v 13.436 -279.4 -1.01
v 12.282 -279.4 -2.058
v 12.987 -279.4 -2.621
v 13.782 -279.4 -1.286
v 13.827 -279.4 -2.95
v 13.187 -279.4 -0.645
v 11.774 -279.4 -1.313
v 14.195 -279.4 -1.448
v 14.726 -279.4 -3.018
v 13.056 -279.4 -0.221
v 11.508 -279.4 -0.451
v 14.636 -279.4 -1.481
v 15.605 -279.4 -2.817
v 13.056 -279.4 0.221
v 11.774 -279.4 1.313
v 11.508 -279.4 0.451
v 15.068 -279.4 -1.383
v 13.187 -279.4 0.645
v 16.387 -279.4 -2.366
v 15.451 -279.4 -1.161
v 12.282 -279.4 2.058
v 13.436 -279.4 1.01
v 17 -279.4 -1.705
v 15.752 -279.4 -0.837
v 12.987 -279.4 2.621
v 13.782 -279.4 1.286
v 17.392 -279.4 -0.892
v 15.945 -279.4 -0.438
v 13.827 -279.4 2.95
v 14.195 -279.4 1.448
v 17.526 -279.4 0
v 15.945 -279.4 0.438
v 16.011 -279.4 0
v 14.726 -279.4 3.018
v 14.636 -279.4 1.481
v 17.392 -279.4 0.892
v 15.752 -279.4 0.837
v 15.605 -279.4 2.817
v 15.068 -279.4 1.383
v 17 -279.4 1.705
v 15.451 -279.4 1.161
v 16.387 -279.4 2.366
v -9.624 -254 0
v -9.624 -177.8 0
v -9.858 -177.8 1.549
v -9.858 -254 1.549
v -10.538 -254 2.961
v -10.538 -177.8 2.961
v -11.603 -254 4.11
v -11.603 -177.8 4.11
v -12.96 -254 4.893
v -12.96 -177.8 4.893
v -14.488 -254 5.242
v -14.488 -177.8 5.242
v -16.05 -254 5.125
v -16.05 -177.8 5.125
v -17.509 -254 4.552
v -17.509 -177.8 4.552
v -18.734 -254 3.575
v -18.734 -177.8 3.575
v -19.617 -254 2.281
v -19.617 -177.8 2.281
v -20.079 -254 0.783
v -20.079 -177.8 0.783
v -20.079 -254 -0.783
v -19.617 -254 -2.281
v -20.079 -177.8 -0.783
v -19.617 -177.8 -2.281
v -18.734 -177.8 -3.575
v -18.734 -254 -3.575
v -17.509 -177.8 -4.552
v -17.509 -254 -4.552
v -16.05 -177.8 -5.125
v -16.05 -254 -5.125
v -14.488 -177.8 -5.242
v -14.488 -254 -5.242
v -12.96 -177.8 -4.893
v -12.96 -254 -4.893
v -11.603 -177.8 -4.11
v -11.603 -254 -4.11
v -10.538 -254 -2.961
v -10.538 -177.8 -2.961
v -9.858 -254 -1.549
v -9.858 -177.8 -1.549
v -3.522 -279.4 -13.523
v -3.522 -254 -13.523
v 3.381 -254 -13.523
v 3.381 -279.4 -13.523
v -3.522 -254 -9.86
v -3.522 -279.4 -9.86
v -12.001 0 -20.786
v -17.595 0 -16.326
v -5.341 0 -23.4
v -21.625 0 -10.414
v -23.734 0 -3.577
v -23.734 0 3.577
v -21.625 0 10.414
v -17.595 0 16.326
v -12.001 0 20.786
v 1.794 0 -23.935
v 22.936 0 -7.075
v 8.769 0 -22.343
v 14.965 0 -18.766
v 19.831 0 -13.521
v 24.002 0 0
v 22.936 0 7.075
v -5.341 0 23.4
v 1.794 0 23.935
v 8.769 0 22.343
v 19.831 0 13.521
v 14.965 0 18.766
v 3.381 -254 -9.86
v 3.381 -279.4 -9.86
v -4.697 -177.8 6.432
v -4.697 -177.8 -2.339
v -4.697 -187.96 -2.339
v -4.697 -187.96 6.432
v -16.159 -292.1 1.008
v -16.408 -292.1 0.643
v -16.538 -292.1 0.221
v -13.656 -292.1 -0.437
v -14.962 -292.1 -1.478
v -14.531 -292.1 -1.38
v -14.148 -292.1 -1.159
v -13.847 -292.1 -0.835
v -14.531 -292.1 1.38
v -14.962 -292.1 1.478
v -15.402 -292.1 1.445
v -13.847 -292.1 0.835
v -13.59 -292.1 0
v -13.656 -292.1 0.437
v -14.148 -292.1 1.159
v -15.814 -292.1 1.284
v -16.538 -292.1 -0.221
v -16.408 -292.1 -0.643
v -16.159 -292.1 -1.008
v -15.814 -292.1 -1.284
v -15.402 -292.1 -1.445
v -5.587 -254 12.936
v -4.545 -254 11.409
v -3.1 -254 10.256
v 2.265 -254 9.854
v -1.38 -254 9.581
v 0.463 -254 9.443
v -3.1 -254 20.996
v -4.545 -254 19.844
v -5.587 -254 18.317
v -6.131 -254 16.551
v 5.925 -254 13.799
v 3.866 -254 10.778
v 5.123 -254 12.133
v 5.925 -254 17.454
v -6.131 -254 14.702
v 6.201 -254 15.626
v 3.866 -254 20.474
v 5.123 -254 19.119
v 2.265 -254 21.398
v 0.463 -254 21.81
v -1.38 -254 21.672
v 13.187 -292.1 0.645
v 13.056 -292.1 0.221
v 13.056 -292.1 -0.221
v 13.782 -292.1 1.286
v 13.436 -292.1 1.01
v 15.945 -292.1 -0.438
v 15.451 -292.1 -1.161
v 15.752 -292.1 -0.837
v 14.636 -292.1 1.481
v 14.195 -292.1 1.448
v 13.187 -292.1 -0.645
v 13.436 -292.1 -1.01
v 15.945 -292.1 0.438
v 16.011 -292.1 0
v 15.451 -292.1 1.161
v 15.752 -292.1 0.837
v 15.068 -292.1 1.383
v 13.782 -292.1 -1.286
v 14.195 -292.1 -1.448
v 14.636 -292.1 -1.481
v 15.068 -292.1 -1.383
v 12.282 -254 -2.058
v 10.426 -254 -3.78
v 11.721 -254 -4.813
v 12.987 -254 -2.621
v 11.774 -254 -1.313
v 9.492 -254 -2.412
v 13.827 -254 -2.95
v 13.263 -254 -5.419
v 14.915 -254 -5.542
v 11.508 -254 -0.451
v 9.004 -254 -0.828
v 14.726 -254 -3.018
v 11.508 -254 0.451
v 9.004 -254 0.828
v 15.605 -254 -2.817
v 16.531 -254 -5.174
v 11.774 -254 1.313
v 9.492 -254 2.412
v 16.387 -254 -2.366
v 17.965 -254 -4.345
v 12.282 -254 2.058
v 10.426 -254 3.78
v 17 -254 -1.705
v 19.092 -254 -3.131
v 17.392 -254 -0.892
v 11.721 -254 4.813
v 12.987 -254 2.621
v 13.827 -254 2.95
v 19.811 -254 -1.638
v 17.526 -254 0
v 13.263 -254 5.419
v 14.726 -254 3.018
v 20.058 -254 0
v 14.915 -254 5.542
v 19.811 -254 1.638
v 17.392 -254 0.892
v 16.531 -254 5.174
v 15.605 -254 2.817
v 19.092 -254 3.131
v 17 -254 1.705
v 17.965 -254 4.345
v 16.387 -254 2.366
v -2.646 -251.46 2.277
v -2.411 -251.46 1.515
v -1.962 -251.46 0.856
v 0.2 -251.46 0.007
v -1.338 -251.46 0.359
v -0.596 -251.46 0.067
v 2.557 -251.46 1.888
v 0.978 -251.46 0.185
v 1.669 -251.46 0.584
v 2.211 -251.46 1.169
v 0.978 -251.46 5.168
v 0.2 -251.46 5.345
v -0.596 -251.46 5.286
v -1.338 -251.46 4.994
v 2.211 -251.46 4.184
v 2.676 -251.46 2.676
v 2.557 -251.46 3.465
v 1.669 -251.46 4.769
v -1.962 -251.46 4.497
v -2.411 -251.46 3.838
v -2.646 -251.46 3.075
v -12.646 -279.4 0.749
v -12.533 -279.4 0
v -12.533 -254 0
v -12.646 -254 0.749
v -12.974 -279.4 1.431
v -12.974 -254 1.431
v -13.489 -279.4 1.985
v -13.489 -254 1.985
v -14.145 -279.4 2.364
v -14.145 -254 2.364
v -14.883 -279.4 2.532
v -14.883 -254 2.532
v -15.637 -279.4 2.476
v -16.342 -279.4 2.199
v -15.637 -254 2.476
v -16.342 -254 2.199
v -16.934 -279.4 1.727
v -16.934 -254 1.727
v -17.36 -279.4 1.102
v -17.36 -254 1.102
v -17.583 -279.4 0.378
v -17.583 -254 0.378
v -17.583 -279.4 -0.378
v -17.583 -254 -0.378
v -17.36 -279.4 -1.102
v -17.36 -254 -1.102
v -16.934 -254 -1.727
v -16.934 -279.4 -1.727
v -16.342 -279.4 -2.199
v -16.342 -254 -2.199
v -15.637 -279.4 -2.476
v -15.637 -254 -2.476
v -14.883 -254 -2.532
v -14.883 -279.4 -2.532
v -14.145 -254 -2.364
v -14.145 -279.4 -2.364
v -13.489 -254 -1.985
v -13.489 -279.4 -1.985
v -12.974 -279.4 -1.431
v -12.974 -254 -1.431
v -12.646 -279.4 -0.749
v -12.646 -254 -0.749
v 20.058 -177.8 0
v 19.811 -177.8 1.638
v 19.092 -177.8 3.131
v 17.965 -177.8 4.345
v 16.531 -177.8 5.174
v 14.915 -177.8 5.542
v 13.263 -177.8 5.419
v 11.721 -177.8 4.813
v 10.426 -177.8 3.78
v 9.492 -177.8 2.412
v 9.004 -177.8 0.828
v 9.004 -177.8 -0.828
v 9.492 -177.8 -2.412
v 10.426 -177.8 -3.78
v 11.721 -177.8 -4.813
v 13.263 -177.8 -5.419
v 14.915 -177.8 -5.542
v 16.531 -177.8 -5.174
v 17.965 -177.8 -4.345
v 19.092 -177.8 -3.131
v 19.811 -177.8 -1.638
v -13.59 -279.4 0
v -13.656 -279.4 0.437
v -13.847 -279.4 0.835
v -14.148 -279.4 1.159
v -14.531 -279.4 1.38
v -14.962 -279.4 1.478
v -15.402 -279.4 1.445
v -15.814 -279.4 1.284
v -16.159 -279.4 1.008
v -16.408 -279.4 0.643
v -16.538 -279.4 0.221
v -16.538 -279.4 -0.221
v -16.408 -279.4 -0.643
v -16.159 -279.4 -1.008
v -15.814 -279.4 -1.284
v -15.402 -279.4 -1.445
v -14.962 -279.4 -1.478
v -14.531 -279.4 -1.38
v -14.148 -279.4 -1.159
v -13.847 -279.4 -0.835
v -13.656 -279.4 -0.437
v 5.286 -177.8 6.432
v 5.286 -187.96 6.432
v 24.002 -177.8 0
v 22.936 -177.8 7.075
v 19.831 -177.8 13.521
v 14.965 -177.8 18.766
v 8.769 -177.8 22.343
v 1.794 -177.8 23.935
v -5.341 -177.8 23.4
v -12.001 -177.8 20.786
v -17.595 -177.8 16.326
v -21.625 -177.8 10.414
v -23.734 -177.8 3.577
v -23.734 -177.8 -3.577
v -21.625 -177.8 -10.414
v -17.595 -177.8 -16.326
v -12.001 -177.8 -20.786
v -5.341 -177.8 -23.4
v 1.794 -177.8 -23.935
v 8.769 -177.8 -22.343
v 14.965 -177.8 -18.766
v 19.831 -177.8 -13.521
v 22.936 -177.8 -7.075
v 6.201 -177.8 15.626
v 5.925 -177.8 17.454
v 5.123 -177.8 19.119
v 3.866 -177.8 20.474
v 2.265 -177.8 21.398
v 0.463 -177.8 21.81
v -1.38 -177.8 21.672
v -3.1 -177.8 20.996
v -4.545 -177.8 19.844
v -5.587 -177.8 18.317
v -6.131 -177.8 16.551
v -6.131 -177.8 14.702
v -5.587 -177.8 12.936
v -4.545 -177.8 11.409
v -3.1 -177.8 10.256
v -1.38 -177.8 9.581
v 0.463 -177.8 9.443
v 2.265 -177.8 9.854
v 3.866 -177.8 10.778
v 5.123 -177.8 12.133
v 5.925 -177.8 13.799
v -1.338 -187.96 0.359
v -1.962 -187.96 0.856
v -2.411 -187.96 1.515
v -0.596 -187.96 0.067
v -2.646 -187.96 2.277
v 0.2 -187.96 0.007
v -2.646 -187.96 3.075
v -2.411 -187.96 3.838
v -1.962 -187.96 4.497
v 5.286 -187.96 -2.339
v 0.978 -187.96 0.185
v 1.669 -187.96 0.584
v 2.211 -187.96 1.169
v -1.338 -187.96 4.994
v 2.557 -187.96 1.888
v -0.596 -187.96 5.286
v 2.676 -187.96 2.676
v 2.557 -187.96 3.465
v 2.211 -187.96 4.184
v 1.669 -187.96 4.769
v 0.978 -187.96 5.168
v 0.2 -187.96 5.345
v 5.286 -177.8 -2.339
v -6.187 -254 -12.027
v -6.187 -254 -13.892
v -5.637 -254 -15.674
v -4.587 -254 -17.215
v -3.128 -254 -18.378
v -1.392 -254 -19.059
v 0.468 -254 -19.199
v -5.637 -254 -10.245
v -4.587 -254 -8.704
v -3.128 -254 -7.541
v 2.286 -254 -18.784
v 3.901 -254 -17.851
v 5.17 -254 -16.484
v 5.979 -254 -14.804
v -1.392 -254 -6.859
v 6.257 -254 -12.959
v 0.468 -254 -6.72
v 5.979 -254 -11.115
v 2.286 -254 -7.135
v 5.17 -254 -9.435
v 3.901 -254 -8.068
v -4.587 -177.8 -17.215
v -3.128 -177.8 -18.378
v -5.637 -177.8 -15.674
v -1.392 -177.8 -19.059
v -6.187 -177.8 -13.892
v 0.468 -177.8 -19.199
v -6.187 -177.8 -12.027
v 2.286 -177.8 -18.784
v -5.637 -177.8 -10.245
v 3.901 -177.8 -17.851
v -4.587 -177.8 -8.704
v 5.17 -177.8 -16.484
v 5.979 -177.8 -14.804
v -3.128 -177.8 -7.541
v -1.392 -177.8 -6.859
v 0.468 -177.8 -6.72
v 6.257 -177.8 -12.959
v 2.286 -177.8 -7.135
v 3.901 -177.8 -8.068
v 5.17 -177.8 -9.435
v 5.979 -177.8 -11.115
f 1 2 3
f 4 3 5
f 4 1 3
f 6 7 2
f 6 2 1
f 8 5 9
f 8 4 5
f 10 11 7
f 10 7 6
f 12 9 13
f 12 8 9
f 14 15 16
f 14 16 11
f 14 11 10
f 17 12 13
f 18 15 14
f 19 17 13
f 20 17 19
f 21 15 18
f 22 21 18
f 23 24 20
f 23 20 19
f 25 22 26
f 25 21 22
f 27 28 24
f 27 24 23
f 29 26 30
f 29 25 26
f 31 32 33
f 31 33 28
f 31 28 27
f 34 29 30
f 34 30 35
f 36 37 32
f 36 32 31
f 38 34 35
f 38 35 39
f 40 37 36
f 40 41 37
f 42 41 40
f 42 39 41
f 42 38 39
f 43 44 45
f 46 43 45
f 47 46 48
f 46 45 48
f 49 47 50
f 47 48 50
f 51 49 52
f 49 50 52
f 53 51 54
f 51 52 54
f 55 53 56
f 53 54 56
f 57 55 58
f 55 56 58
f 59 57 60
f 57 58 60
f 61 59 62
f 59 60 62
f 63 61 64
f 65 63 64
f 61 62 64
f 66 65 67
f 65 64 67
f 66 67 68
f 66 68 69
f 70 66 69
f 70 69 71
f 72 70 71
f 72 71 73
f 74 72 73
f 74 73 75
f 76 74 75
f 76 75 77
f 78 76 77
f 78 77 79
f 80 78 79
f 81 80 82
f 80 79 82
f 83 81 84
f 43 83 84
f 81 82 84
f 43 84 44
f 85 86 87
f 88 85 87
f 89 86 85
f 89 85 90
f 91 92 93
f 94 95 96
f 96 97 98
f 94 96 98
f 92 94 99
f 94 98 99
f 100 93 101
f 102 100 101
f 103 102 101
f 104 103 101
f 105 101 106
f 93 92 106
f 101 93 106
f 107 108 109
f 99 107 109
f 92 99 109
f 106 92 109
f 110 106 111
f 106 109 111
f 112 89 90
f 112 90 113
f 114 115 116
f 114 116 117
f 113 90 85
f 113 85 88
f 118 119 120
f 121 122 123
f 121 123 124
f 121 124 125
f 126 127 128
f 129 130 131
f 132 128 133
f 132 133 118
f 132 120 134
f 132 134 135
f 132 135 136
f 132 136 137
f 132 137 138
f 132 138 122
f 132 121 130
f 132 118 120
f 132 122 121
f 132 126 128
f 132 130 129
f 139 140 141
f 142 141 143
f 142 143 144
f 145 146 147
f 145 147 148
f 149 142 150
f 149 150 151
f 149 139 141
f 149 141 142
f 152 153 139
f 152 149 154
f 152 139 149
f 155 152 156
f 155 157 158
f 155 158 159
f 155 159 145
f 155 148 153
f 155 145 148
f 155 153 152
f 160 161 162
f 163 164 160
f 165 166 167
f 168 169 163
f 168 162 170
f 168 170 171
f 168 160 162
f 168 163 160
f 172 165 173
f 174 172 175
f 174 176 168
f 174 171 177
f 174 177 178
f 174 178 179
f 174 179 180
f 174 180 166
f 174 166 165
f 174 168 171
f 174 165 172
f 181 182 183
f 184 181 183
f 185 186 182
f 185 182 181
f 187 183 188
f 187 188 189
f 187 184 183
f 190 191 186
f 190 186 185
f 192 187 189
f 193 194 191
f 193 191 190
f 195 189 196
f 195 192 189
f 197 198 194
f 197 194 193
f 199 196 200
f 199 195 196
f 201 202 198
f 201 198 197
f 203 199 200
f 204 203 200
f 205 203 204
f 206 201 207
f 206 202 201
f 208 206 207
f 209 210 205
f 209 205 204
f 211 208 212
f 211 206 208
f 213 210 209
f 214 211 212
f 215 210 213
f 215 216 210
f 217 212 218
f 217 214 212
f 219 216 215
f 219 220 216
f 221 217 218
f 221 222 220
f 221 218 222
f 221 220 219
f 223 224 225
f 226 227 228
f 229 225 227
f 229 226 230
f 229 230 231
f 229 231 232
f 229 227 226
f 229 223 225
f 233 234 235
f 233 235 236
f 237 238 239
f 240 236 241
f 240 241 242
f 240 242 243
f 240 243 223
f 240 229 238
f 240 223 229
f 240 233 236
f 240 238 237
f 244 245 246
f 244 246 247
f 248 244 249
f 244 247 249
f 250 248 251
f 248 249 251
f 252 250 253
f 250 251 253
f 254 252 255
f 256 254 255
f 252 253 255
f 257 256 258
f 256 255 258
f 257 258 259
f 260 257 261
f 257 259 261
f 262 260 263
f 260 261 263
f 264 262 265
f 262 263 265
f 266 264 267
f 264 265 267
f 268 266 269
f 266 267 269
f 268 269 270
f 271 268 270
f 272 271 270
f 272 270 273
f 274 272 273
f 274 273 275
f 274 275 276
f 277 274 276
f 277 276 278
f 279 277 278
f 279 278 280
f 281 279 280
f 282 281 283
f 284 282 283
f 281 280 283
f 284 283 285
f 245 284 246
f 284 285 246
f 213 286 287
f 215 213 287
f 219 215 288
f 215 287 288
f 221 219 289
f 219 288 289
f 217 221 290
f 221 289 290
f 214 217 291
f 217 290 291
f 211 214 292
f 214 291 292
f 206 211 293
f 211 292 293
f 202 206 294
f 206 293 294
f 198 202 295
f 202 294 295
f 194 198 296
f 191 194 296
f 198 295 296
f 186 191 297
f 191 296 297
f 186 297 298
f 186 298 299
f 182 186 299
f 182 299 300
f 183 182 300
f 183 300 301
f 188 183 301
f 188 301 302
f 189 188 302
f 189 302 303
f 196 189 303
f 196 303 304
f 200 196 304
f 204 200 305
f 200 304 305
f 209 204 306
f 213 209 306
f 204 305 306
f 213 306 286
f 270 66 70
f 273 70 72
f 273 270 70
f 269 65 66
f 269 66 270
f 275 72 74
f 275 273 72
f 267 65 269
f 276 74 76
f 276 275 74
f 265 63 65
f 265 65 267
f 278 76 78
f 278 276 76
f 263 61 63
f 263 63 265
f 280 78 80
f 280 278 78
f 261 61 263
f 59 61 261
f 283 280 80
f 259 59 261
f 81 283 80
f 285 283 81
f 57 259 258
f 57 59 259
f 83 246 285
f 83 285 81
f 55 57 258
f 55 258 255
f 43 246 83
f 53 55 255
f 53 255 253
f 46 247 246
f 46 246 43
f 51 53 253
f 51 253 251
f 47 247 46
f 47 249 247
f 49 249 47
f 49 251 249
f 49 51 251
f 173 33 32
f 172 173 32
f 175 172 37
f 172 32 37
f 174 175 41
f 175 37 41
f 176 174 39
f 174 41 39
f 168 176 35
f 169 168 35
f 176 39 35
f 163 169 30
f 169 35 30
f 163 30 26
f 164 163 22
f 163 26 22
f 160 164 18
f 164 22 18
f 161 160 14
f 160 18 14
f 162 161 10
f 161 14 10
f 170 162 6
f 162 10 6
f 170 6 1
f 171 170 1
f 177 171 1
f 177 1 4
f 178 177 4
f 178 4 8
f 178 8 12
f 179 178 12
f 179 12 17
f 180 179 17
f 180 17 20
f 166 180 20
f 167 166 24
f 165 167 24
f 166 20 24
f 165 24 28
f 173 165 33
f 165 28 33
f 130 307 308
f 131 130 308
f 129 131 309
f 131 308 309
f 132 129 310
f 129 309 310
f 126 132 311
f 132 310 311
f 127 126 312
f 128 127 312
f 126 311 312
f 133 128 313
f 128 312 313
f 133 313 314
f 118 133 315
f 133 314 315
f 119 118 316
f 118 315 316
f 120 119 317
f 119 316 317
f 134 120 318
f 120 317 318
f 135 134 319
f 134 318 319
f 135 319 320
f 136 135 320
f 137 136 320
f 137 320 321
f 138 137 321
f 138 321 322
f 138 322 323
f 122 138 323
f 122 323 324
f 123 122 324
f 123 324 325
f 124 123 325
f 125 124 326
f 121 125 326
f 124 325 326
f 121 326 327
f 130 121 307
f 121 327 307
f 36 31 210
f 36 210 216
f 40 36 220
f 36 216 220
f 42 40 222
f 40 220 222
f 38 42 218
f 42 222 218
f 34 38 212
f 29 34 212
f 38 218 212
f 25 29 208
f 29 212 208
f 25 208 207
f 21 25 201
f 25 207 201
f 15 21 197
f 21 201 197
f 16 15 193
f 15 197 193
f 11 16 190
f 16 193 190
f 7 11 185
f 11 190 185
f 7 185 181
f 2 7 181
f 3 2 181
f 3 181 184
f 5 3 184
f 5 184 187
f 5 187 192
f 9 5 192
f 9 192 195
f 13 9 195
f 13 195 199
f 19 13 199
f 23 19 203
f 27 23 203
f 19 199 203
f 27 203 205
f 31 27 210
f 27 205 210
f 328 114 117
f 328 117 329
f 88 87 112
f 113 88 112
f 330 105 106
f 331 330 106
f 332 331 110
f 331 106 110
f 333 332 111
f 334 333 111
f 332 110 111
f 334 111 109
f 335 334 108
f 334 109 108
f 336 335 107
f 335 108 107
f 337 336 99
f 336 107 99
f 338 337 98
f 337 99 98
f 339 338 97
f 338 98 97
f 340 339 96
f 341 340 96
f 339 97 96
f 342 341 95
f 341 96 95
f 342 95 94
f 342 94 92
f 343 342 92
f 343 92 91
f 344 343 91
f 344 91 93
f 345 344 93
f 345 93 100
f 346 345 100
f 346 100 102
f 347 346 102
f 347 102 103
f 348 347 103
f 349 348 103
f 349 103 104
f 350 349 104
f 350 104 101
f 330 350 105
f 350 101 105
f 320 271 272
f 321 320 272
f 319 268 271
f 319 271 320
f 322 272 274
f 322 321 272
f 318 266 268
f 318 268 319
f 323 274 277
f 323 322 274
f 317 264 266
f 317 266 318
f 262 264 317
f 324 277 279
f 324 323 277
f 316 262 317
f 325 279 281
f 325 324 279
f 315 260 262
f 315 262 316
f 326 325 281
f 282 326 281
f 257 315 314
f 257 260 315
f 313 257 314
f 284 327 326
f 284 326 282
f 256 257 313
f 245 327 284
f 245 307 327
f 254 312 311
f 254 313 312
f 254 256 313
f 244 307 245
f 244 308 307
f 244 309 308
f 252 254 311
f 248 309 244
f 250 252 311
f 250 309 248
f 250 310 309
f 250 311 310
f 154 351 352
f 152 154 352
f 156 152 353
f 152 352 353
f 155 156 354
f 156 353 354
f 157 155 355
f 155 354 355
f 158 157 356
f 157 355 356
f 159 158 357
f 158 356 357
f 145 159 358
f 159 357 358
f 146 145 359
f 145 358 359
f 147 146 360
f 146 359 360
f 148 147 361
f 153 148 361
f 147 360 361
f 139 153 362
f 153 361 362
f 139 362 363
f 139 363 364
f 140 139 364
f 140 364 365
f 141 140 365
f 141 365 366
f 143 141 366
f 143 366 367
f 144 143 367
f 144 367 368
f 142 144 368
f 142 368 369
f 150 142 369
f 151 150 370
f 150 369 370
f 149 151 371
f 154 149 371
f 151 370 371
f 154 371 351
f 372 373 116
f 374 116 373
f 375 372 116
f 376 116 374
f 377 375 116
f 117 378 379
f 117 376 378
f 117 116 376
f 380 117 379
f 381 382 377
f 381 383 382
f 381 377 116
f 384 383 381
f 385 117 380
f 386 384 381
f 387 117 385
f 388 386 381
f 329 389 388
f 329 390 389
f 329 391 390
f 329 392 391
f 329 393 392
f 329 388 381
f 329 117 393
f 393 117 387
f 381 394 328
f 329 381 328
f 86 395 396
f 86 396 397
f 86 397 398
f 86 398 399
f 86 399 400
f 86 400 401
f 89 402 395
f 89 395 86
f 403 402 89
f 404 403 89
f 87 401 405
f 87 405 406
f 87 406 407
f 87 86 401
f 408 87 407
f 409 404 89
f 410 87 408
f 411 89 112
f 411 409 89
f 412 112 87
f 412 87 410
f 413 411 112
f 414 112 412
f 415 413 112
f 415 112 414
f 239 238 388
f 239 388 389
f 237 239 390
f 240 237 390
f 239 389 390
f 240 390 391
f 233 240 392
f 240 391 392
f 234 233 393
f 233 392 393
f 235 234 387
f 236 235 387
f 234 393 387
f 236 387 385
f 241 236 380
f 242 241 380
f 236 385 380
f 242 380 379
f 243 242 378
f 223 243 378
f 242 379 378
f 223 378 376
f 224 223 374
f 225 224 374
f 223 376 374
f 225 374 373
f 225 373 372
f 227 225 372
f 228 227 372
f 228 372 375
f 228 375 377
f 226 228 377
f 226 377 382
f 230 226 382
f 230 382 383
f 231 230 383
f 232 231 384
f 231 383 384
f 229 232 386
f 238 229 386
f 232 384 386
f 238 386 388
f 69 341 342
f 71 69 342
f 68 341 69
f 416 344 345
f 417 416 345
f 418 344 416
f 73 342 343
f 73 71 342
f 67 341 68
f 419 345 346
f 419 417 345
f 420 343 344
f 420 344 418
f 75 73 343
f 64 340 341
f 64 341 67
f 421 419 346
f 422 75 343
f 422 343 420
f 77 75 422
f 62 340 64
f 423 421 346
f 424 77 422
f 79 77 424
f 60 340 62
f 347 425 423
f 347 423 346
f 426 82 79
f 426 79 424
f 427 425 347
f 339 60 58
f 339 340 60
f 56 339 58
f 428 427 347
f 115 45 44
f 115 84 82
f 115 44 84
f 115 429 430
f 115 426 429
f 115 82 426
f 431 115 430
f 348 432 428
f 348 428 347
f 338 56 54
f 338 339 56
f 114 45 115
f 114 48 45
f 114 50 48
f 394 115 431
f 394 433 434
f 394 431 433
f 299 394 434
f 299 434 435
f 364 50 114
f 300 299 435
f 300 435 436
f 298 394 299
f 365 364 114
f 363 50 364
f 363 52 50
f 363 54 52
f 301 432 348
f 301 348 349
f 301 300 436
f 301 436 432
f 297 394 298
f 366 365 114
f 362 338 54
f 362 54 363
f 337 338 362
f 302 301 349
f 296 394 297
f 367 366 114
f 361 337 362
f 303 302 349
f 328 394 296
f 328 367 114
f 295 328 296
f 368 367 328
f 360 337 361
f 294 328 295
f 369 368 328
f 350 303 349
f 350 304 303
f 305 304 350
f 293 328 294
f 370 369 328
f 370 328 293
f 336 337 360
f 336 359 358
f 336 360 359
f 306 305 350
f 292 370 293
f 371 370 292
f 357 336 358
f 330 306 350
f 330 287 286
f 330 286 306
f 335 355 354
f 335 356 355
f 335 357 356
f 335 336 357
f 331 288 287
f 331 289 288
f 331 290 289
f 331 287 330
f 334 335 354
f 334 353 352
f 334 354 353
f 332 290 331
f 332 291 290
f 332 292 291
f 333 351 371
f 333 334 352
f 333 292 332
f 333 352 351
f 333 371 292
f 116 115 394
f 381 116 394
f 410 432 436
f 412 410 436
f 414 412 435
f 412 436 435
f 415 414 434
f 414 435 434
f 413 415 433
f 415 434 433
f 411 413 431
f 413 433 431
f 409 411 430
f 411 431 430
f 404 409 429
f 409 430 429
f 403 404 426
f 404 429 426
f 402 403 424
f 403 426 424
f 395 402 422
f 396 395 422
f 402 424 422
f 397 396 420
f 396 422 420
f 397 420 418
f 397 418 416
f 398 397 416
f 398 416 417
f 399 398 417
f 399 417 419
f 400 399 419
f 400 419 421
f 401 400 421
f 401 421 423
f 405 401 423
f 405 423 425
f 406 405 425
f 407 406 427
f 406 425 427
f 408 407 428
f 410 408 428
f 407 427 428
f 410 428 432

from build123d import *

# Parameters (mm, degrees)
F0_R      = 24.0021072249
F1_DEPTH  = 177.8
F2_R      = 5.2565656239
F2_R_2    = 5.5580260463
F3_DEPTH  = 76.2
F4_R      = 2.5394375709
F4_R_2    = 3.0260152953
F5_DEPTH  = 25.4
F6_R      = 1.4824915772
F6_R_2    = 1.4854629447
F7_DEPTH  = 12.7
F8_W      = 9.9838948809
F8_H      = 8.7704055477
F9_DEPTH  = 10.16
F10_R     = 2.6763905771
F11_DEPTH = 63.5
F12_R     = 6.2569040354
F13_DEPTH = 76.2
F14_W     = 6.9022711832
F14_H     = 3.66242975
F15_DEPTH = 25.4
F16_R     = 6.2007059651
F17_DEPTH = 76.2


# Not quite as in the source:
# - a length typed as a fraction of an inch, garbled in the dataset ("3 / 203.2 mm" for 3/8 in), is restored


with BuildPart() as f1:
    # F0 (on Front) → F1 (new body)
    with BuildSketch(Plane.XZ):
        Circle(F0_R)
    extrude(amount=F1_DEPTH)

    # F2 (on face) → F3 (join)
    with BuildSketch(Plane.XZ.offset(177.8)):
        with Locations((-14.8806795478, 0)):
            Circle(F2_R)
        with Locations((14.4999595359, 0)):
            Circle(F2_R_2)
    extrude(amount=F3_DEPTH)

    # F4 (on face) → F5 (join)
    with BuildSketch(Plane.XZ.offset(254)):
        with Locations((-15.0723066181, 0)):
            Circle(F4_R)
        with Locations((14.4999595359, 0)):
            Circle(F4_R_2)
    extrude(amount=F5_DEPTH)

    # F6 (on face) → F7 (join)
    with BuildSketch(Plane.XZ.offset(279.4)):
        with Locations((-15.0723066181, 0)):
            Circle(F6_R)
        with Locations((14.5250931382, 0)):
            Circle(F6_R_2)
    extrude(amount=F7_DEPTH)

    # F8 (on face) → F9 (join)
    with BuildSketch(Plane.XZ.offset(177.8)):
        with Locations((0.2944918815, 2.0464671543)):
            Rectangle(F8_W, F8_H)
    extrude(amount=F9_DEPTH)

    # F10 (on face) → F11 (join)
    with BuildSketch(Plane.XZ.offset(187.96)):
        with Locations((0, 2.6763908099)):
            Circle(F10_R)
    extrude(amount=F11_DEPTH)

    # F12 (on face) → F13 (join)
    with BuildSketch(Plane.XZ.offset(177.8)):
        with Locations((0, -12.9593666643)):
            Circle(F12_R)
    extrude(amount=F13_DEPTH)

    # F14 (on face) → F15 (join)
    with BuildSketch(Plane.XZ.offset(254)):
        with Locations((-0.0704309205, -11.6916019469)):
            Rectangle(F14_W, F14_H)
    extrude(amount=F15_DEPTH)

    # F16 (on face) → F17 (join)
    with BuildSketch(Plane.XZ.offset(177.8)):
        with Locations((0, 15.626385808)):
            Circle(F16_R)
    extrude(amount=F17_DEPTH)


solid = f1.part
